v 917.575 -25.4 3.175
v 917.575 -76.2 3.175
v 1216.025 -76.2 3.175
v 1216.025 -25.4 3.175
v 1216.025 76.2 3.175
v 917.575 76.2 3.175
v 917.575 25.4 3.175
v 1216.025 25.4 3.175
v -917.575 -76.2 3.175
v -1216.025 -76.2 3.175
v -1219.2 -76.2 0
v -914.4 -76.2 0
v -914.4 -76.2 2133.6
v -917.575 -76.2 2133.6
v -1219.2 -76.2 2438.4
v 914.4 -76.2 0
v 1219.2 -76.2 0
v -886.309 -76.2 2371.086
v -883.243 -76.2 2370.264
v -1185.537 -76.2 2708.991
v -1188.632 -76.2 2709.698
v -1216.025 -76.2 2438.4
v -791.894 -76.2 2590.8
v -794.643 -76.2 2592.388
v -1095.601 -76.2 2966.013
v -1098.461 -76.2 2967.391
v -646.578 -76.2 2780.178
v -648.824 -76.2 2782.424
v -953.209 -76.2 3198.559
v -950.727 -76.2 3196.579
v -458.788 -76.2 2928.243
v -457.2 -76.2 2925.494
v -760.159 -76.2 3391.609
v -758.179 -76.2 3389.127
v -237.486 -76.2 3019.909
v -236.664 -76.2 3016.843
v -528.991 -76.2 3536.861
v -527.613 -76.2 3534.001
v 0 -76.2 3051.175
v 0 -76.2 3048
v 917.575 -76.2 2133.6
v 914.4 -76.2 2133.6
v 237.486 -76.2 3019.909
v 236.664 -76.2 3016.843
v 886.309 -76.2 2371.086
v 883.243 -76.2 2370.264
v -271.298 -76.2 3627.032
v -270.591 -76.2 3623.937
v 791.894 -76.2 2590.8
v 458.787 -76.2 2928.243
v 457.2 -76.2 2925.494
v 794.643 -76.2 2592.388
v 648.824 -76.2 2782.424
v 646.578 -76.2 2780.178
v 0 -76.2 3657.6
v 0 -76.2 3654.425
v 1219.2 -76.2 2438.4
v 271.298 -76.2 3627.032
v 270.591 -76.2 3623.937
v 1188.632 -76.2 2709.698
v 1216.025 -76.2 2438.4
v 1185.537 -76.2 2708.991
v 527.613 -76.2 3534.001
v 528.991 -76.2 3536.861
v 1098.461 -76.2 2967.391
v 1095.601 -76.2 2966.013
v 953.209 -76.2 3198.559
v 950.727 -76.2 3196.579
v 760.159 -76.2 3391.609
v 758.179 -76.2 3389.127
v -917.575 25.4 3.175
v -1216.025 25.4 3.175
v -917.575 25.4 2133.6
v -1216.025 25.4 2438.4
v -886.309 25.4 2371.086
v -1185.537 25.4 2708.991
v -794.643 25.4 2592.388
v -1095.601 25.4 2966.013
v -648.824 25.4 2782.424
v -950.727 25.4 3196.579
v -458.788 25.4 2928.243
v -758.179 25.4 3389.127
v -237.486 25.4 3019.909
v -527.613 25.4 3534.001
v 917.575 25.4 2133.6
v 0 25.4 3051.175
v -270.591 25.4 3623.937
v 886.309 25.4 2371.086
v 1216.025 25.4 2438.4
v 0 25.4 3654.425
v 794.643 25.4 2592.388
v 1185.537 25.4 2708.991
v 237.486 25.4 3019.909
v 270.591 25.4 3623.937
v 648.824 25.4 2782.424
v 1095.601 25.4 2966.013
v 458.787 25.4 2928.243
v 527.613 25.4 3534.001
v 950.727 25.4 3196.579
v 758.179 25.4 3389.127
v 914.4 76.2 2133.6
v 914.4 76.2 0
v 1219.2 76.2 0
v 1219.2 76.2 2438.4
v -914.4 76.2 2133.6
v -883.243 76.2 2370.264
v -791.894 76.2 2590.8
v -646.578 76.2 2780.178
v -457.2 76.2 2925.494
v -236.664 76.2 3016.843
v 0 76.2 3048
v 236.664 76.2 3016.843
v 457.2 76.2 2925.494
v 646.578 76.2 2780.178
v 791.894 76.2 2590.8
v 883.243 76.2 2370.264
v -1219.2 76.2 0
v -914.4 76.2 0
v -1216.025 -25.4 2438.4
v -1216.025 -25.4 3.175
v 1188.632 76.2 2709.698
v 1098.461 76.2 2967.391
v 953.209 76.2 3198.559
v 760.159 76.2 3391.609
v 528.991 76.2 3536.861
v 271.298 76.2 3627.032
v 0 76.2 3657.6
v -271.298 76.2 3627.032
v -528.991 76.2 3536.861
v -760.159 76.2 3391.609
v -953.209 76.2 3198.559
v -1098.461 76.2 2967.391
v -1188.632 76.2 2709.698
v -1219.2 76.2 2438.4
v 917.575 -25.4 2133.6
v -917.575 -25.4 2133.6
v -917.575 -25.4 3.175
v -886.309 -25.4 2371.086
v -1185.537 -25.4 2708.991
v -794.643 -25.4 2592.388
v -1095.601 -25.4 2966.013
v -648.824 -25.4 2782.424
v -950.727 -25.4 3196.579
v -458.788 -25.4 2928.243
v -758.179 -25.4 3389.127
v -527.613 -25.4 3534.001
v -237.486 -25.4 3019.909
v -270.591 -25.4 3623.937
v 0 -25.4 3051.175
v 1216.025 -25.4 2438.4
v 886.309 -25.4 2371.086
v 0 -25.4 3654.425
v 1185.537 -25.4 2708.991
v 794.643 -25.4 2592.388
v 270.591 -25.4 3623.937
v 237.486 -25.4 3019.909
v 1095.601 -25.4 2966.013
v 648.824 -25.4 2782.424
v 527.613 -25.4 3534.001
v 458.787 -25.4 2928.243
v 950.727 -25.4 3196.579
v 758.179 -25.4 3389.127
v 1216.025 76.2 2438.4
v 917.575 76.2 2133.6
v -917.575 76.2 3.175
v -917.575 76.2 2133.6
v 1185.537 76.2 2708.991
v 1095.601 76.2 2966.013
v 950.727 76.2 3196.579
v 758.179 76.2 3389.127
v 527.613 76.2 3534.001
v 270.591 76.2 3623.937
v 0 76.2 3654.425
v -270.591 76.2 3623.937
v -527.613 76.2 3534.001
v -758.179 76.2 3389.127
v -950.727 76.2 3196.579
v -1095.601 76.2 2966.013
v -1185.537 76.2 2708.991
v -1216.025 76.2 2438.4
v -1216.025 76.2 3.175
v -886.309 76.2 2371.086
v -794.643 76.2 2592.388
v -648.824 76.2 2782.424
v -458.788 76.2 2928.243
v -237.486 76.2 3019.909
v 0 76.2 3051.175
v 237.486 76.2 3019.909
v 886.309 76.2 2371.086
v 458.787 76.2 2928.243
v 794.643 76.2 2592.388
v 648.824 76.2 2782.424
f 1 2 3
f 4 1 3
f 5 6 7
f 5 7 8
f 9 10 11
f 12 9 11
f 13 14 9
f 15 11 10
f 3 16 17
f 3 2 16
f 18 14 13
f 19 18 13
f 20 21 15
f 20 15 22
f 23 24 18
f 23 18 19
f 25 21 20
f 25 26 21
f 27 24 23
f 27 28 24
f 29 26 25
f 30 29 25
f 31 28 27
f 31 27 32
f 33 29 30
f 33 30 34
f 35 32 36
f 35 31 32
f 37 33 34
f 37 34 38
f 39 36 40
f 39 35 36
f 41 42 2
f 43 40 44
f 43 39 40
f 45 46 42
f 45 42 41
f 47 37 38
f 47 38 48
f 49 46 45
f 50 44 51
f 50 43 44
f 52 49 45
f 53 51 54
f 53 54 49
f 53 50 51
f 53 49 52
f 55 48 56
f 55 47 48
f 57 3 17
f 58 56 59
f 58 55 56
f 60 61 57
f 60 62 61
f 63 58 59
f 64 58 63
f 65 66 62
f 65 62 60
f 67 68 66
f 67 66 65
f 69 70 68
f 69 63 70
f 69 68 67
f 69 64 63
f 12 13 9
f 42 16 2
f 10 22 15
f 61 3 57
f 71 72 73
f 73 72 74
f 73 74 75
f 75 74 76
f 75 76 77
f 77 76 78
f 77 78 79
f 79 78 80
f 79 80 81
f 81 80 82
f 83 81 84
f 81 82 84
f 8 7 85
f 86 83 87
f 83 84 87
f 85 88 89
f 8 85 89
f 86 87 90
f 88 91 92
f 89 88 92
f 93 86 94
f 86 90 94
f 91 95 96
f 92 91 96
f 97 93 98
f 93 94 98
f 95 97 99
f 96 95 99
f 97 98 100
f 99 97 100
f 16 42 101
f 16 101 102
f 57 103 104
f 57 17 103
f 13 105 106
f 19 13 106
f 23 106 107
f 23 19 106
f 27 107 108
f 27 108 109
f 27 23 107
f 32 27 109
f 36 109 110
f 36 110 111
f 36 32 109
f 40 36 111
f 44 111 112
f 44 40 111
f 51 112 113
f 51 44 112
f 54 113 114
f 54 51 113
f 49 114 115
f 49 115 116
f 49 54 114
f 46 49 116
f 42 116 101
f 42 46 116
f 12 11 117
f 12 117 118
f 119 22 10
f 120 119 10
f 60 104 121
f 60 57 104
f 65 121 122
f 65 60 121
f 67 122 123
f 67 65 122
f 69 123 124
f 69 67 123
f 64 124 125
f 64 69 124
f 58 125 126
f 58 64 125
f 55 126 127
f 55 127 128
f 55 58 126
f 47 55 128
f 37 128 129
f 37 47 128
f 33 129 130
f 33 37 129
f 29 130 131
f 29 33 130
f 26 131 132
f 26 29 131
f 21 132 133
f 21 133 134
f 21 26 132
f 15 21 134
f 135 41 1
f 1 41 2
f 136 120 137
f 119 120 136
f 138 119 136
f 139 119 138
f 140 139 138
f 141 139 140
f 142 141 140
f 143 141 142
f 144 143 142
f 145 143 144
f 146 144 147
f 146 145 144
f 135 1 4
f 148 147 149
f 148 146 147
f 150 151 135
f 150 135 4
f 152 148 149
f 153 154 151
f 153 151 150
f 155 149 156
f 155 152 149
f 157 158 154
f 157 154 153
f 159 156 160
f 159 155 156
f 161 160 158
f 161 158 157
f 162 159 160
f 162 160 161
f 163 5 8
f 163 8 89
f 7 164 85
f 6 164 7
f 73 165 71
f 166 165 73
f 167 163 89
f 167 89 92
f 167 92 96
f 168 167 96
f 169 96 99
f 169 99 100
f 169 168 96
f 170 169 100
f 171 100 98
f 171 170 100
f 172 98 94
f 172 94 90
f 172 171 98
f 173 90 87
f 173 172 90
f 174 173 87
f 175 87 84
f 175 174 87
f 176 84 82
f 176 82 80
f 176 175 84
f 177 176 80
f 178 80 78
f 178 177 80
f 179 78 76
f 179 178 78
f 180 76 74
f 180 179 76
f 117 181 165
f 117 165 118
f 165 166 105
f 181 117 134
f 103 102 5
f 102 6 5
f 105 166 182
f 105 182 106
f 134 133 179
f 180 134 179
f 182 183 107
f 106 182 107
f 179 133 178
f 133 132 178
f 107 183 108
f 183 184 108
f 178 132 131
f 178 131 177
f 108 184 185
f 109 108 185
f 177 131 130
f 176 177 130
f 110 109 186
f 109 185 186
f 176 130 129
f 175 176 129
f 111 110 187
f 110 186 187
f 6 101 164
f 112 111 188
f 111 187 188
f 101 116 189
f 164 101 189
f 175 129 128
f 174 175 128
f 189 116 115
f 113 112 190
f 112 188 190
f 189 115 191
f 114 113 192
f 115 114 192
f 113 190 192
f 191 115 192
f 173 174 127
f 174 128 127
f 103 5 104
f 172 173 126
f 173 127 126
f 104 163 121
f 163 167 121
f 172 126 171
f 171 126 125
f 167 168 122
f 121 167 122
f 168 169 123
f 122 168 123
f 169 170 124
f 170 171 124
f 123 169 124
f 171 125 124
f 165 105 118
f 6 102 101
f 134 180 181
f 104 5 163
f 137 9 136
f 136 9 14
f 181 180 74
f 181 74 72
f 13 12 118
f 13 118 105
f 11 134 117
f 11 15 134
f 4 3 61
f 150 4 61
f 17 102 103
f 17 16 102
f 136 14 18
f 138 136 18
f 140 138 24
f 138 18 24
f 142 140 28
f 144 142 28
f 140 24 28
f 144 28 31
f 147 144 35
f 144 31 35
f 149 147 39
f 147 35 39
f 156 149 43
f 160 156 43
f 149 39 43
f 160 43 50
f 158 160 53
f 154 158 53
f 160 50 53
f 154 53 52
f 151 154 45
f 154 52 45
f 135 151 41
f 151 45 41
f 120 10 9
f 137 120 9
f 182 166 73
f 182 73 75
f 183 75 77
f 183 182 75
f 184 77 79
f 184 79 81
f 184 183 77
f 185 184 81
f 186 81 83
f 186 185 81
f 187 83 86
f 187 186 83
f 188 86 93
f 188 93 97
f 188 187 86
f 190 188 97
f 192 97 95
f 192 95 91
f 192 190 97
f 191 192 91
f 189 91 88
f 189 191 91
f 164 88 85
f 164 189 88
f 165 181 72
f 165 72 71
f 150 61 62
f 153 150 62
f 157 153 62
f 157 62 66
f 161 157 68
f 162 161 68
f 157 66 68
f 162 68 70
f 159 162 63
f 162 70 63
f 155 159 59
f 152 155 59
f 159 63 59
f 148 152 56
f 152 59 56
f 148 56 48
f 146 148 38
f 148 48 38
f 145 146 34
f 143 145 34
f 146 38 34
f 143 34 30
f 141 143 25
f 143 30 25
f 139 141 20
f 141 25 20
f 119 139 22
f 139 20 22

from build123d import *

# Parameters (mm, degrees)
F1_DEPTH = 76.2
F3_DEPTH = 50.8


with BuildPart() as f1:
    # F0 (on Front) → F1 (new body)
    with BuildSketch(Plane.XZ):
        with BuildLine():
            Line((-1219.2, 2438.4), (-1219.2, 0))
            Line((-1219.2, 0), (-914.4, 0))
            Line((-914.4, 0), (-914.4, 2133.6))
            ThreePointArc((-914.4, 2133.6), (0, 3048), (914.4, 2133.6))
            Line((914.4, 2133.6), (914.4, 0))
            Line((914.4, 0), (1219.2, 0))
            Line((1219.2, 0), (1219.2, 2438.4))
            ThreePointArc((1219.2, 2438.4), (0, 3657.6), (-1219.2, 2438.4))
        make_face()
    extrude(amount=F1_DEPTH)

    # F2 (on face) → F3 (cut)
    with BuildSketch(Plane.XZ.offset(76.2)):
        with BuildLine():
            ThreePointArc((-917.575, 2133.6), (0, 3051.175), (917.575, 2133.6))
            Line((917.575, 2133.6), (917.575, 3.175))
            Line((917.575, 3.175), (1216.025, 3.175))
            Line((1216.025, 3.175), (1216.025, 2438.4))
            ThreePointArc((1216.025, 2438.4), (0, 3654.425), (-1216.025, 2438.4))
            Line((-1216.025, 2438.4), (-1216.025, 3.175))
            Line((-1216.025, 3.175), (-917.575, 3.175))
            Line((-917.575, 3.175), (-917.575, 2133.6))
        make_face()
    extrude(amount=-F3_DEPTH, mode=Mode.SUBTRACT)

    # F4: F1 across face


with BuildPart() as f1_1:
    add(f1.part)
    add(f1.part.mirror(Plane(origin=(0, 0, 2177.935022), x_dir=(1, 0, 0), z_dir=(0, 1, 0))))


solid = f1_1.part
